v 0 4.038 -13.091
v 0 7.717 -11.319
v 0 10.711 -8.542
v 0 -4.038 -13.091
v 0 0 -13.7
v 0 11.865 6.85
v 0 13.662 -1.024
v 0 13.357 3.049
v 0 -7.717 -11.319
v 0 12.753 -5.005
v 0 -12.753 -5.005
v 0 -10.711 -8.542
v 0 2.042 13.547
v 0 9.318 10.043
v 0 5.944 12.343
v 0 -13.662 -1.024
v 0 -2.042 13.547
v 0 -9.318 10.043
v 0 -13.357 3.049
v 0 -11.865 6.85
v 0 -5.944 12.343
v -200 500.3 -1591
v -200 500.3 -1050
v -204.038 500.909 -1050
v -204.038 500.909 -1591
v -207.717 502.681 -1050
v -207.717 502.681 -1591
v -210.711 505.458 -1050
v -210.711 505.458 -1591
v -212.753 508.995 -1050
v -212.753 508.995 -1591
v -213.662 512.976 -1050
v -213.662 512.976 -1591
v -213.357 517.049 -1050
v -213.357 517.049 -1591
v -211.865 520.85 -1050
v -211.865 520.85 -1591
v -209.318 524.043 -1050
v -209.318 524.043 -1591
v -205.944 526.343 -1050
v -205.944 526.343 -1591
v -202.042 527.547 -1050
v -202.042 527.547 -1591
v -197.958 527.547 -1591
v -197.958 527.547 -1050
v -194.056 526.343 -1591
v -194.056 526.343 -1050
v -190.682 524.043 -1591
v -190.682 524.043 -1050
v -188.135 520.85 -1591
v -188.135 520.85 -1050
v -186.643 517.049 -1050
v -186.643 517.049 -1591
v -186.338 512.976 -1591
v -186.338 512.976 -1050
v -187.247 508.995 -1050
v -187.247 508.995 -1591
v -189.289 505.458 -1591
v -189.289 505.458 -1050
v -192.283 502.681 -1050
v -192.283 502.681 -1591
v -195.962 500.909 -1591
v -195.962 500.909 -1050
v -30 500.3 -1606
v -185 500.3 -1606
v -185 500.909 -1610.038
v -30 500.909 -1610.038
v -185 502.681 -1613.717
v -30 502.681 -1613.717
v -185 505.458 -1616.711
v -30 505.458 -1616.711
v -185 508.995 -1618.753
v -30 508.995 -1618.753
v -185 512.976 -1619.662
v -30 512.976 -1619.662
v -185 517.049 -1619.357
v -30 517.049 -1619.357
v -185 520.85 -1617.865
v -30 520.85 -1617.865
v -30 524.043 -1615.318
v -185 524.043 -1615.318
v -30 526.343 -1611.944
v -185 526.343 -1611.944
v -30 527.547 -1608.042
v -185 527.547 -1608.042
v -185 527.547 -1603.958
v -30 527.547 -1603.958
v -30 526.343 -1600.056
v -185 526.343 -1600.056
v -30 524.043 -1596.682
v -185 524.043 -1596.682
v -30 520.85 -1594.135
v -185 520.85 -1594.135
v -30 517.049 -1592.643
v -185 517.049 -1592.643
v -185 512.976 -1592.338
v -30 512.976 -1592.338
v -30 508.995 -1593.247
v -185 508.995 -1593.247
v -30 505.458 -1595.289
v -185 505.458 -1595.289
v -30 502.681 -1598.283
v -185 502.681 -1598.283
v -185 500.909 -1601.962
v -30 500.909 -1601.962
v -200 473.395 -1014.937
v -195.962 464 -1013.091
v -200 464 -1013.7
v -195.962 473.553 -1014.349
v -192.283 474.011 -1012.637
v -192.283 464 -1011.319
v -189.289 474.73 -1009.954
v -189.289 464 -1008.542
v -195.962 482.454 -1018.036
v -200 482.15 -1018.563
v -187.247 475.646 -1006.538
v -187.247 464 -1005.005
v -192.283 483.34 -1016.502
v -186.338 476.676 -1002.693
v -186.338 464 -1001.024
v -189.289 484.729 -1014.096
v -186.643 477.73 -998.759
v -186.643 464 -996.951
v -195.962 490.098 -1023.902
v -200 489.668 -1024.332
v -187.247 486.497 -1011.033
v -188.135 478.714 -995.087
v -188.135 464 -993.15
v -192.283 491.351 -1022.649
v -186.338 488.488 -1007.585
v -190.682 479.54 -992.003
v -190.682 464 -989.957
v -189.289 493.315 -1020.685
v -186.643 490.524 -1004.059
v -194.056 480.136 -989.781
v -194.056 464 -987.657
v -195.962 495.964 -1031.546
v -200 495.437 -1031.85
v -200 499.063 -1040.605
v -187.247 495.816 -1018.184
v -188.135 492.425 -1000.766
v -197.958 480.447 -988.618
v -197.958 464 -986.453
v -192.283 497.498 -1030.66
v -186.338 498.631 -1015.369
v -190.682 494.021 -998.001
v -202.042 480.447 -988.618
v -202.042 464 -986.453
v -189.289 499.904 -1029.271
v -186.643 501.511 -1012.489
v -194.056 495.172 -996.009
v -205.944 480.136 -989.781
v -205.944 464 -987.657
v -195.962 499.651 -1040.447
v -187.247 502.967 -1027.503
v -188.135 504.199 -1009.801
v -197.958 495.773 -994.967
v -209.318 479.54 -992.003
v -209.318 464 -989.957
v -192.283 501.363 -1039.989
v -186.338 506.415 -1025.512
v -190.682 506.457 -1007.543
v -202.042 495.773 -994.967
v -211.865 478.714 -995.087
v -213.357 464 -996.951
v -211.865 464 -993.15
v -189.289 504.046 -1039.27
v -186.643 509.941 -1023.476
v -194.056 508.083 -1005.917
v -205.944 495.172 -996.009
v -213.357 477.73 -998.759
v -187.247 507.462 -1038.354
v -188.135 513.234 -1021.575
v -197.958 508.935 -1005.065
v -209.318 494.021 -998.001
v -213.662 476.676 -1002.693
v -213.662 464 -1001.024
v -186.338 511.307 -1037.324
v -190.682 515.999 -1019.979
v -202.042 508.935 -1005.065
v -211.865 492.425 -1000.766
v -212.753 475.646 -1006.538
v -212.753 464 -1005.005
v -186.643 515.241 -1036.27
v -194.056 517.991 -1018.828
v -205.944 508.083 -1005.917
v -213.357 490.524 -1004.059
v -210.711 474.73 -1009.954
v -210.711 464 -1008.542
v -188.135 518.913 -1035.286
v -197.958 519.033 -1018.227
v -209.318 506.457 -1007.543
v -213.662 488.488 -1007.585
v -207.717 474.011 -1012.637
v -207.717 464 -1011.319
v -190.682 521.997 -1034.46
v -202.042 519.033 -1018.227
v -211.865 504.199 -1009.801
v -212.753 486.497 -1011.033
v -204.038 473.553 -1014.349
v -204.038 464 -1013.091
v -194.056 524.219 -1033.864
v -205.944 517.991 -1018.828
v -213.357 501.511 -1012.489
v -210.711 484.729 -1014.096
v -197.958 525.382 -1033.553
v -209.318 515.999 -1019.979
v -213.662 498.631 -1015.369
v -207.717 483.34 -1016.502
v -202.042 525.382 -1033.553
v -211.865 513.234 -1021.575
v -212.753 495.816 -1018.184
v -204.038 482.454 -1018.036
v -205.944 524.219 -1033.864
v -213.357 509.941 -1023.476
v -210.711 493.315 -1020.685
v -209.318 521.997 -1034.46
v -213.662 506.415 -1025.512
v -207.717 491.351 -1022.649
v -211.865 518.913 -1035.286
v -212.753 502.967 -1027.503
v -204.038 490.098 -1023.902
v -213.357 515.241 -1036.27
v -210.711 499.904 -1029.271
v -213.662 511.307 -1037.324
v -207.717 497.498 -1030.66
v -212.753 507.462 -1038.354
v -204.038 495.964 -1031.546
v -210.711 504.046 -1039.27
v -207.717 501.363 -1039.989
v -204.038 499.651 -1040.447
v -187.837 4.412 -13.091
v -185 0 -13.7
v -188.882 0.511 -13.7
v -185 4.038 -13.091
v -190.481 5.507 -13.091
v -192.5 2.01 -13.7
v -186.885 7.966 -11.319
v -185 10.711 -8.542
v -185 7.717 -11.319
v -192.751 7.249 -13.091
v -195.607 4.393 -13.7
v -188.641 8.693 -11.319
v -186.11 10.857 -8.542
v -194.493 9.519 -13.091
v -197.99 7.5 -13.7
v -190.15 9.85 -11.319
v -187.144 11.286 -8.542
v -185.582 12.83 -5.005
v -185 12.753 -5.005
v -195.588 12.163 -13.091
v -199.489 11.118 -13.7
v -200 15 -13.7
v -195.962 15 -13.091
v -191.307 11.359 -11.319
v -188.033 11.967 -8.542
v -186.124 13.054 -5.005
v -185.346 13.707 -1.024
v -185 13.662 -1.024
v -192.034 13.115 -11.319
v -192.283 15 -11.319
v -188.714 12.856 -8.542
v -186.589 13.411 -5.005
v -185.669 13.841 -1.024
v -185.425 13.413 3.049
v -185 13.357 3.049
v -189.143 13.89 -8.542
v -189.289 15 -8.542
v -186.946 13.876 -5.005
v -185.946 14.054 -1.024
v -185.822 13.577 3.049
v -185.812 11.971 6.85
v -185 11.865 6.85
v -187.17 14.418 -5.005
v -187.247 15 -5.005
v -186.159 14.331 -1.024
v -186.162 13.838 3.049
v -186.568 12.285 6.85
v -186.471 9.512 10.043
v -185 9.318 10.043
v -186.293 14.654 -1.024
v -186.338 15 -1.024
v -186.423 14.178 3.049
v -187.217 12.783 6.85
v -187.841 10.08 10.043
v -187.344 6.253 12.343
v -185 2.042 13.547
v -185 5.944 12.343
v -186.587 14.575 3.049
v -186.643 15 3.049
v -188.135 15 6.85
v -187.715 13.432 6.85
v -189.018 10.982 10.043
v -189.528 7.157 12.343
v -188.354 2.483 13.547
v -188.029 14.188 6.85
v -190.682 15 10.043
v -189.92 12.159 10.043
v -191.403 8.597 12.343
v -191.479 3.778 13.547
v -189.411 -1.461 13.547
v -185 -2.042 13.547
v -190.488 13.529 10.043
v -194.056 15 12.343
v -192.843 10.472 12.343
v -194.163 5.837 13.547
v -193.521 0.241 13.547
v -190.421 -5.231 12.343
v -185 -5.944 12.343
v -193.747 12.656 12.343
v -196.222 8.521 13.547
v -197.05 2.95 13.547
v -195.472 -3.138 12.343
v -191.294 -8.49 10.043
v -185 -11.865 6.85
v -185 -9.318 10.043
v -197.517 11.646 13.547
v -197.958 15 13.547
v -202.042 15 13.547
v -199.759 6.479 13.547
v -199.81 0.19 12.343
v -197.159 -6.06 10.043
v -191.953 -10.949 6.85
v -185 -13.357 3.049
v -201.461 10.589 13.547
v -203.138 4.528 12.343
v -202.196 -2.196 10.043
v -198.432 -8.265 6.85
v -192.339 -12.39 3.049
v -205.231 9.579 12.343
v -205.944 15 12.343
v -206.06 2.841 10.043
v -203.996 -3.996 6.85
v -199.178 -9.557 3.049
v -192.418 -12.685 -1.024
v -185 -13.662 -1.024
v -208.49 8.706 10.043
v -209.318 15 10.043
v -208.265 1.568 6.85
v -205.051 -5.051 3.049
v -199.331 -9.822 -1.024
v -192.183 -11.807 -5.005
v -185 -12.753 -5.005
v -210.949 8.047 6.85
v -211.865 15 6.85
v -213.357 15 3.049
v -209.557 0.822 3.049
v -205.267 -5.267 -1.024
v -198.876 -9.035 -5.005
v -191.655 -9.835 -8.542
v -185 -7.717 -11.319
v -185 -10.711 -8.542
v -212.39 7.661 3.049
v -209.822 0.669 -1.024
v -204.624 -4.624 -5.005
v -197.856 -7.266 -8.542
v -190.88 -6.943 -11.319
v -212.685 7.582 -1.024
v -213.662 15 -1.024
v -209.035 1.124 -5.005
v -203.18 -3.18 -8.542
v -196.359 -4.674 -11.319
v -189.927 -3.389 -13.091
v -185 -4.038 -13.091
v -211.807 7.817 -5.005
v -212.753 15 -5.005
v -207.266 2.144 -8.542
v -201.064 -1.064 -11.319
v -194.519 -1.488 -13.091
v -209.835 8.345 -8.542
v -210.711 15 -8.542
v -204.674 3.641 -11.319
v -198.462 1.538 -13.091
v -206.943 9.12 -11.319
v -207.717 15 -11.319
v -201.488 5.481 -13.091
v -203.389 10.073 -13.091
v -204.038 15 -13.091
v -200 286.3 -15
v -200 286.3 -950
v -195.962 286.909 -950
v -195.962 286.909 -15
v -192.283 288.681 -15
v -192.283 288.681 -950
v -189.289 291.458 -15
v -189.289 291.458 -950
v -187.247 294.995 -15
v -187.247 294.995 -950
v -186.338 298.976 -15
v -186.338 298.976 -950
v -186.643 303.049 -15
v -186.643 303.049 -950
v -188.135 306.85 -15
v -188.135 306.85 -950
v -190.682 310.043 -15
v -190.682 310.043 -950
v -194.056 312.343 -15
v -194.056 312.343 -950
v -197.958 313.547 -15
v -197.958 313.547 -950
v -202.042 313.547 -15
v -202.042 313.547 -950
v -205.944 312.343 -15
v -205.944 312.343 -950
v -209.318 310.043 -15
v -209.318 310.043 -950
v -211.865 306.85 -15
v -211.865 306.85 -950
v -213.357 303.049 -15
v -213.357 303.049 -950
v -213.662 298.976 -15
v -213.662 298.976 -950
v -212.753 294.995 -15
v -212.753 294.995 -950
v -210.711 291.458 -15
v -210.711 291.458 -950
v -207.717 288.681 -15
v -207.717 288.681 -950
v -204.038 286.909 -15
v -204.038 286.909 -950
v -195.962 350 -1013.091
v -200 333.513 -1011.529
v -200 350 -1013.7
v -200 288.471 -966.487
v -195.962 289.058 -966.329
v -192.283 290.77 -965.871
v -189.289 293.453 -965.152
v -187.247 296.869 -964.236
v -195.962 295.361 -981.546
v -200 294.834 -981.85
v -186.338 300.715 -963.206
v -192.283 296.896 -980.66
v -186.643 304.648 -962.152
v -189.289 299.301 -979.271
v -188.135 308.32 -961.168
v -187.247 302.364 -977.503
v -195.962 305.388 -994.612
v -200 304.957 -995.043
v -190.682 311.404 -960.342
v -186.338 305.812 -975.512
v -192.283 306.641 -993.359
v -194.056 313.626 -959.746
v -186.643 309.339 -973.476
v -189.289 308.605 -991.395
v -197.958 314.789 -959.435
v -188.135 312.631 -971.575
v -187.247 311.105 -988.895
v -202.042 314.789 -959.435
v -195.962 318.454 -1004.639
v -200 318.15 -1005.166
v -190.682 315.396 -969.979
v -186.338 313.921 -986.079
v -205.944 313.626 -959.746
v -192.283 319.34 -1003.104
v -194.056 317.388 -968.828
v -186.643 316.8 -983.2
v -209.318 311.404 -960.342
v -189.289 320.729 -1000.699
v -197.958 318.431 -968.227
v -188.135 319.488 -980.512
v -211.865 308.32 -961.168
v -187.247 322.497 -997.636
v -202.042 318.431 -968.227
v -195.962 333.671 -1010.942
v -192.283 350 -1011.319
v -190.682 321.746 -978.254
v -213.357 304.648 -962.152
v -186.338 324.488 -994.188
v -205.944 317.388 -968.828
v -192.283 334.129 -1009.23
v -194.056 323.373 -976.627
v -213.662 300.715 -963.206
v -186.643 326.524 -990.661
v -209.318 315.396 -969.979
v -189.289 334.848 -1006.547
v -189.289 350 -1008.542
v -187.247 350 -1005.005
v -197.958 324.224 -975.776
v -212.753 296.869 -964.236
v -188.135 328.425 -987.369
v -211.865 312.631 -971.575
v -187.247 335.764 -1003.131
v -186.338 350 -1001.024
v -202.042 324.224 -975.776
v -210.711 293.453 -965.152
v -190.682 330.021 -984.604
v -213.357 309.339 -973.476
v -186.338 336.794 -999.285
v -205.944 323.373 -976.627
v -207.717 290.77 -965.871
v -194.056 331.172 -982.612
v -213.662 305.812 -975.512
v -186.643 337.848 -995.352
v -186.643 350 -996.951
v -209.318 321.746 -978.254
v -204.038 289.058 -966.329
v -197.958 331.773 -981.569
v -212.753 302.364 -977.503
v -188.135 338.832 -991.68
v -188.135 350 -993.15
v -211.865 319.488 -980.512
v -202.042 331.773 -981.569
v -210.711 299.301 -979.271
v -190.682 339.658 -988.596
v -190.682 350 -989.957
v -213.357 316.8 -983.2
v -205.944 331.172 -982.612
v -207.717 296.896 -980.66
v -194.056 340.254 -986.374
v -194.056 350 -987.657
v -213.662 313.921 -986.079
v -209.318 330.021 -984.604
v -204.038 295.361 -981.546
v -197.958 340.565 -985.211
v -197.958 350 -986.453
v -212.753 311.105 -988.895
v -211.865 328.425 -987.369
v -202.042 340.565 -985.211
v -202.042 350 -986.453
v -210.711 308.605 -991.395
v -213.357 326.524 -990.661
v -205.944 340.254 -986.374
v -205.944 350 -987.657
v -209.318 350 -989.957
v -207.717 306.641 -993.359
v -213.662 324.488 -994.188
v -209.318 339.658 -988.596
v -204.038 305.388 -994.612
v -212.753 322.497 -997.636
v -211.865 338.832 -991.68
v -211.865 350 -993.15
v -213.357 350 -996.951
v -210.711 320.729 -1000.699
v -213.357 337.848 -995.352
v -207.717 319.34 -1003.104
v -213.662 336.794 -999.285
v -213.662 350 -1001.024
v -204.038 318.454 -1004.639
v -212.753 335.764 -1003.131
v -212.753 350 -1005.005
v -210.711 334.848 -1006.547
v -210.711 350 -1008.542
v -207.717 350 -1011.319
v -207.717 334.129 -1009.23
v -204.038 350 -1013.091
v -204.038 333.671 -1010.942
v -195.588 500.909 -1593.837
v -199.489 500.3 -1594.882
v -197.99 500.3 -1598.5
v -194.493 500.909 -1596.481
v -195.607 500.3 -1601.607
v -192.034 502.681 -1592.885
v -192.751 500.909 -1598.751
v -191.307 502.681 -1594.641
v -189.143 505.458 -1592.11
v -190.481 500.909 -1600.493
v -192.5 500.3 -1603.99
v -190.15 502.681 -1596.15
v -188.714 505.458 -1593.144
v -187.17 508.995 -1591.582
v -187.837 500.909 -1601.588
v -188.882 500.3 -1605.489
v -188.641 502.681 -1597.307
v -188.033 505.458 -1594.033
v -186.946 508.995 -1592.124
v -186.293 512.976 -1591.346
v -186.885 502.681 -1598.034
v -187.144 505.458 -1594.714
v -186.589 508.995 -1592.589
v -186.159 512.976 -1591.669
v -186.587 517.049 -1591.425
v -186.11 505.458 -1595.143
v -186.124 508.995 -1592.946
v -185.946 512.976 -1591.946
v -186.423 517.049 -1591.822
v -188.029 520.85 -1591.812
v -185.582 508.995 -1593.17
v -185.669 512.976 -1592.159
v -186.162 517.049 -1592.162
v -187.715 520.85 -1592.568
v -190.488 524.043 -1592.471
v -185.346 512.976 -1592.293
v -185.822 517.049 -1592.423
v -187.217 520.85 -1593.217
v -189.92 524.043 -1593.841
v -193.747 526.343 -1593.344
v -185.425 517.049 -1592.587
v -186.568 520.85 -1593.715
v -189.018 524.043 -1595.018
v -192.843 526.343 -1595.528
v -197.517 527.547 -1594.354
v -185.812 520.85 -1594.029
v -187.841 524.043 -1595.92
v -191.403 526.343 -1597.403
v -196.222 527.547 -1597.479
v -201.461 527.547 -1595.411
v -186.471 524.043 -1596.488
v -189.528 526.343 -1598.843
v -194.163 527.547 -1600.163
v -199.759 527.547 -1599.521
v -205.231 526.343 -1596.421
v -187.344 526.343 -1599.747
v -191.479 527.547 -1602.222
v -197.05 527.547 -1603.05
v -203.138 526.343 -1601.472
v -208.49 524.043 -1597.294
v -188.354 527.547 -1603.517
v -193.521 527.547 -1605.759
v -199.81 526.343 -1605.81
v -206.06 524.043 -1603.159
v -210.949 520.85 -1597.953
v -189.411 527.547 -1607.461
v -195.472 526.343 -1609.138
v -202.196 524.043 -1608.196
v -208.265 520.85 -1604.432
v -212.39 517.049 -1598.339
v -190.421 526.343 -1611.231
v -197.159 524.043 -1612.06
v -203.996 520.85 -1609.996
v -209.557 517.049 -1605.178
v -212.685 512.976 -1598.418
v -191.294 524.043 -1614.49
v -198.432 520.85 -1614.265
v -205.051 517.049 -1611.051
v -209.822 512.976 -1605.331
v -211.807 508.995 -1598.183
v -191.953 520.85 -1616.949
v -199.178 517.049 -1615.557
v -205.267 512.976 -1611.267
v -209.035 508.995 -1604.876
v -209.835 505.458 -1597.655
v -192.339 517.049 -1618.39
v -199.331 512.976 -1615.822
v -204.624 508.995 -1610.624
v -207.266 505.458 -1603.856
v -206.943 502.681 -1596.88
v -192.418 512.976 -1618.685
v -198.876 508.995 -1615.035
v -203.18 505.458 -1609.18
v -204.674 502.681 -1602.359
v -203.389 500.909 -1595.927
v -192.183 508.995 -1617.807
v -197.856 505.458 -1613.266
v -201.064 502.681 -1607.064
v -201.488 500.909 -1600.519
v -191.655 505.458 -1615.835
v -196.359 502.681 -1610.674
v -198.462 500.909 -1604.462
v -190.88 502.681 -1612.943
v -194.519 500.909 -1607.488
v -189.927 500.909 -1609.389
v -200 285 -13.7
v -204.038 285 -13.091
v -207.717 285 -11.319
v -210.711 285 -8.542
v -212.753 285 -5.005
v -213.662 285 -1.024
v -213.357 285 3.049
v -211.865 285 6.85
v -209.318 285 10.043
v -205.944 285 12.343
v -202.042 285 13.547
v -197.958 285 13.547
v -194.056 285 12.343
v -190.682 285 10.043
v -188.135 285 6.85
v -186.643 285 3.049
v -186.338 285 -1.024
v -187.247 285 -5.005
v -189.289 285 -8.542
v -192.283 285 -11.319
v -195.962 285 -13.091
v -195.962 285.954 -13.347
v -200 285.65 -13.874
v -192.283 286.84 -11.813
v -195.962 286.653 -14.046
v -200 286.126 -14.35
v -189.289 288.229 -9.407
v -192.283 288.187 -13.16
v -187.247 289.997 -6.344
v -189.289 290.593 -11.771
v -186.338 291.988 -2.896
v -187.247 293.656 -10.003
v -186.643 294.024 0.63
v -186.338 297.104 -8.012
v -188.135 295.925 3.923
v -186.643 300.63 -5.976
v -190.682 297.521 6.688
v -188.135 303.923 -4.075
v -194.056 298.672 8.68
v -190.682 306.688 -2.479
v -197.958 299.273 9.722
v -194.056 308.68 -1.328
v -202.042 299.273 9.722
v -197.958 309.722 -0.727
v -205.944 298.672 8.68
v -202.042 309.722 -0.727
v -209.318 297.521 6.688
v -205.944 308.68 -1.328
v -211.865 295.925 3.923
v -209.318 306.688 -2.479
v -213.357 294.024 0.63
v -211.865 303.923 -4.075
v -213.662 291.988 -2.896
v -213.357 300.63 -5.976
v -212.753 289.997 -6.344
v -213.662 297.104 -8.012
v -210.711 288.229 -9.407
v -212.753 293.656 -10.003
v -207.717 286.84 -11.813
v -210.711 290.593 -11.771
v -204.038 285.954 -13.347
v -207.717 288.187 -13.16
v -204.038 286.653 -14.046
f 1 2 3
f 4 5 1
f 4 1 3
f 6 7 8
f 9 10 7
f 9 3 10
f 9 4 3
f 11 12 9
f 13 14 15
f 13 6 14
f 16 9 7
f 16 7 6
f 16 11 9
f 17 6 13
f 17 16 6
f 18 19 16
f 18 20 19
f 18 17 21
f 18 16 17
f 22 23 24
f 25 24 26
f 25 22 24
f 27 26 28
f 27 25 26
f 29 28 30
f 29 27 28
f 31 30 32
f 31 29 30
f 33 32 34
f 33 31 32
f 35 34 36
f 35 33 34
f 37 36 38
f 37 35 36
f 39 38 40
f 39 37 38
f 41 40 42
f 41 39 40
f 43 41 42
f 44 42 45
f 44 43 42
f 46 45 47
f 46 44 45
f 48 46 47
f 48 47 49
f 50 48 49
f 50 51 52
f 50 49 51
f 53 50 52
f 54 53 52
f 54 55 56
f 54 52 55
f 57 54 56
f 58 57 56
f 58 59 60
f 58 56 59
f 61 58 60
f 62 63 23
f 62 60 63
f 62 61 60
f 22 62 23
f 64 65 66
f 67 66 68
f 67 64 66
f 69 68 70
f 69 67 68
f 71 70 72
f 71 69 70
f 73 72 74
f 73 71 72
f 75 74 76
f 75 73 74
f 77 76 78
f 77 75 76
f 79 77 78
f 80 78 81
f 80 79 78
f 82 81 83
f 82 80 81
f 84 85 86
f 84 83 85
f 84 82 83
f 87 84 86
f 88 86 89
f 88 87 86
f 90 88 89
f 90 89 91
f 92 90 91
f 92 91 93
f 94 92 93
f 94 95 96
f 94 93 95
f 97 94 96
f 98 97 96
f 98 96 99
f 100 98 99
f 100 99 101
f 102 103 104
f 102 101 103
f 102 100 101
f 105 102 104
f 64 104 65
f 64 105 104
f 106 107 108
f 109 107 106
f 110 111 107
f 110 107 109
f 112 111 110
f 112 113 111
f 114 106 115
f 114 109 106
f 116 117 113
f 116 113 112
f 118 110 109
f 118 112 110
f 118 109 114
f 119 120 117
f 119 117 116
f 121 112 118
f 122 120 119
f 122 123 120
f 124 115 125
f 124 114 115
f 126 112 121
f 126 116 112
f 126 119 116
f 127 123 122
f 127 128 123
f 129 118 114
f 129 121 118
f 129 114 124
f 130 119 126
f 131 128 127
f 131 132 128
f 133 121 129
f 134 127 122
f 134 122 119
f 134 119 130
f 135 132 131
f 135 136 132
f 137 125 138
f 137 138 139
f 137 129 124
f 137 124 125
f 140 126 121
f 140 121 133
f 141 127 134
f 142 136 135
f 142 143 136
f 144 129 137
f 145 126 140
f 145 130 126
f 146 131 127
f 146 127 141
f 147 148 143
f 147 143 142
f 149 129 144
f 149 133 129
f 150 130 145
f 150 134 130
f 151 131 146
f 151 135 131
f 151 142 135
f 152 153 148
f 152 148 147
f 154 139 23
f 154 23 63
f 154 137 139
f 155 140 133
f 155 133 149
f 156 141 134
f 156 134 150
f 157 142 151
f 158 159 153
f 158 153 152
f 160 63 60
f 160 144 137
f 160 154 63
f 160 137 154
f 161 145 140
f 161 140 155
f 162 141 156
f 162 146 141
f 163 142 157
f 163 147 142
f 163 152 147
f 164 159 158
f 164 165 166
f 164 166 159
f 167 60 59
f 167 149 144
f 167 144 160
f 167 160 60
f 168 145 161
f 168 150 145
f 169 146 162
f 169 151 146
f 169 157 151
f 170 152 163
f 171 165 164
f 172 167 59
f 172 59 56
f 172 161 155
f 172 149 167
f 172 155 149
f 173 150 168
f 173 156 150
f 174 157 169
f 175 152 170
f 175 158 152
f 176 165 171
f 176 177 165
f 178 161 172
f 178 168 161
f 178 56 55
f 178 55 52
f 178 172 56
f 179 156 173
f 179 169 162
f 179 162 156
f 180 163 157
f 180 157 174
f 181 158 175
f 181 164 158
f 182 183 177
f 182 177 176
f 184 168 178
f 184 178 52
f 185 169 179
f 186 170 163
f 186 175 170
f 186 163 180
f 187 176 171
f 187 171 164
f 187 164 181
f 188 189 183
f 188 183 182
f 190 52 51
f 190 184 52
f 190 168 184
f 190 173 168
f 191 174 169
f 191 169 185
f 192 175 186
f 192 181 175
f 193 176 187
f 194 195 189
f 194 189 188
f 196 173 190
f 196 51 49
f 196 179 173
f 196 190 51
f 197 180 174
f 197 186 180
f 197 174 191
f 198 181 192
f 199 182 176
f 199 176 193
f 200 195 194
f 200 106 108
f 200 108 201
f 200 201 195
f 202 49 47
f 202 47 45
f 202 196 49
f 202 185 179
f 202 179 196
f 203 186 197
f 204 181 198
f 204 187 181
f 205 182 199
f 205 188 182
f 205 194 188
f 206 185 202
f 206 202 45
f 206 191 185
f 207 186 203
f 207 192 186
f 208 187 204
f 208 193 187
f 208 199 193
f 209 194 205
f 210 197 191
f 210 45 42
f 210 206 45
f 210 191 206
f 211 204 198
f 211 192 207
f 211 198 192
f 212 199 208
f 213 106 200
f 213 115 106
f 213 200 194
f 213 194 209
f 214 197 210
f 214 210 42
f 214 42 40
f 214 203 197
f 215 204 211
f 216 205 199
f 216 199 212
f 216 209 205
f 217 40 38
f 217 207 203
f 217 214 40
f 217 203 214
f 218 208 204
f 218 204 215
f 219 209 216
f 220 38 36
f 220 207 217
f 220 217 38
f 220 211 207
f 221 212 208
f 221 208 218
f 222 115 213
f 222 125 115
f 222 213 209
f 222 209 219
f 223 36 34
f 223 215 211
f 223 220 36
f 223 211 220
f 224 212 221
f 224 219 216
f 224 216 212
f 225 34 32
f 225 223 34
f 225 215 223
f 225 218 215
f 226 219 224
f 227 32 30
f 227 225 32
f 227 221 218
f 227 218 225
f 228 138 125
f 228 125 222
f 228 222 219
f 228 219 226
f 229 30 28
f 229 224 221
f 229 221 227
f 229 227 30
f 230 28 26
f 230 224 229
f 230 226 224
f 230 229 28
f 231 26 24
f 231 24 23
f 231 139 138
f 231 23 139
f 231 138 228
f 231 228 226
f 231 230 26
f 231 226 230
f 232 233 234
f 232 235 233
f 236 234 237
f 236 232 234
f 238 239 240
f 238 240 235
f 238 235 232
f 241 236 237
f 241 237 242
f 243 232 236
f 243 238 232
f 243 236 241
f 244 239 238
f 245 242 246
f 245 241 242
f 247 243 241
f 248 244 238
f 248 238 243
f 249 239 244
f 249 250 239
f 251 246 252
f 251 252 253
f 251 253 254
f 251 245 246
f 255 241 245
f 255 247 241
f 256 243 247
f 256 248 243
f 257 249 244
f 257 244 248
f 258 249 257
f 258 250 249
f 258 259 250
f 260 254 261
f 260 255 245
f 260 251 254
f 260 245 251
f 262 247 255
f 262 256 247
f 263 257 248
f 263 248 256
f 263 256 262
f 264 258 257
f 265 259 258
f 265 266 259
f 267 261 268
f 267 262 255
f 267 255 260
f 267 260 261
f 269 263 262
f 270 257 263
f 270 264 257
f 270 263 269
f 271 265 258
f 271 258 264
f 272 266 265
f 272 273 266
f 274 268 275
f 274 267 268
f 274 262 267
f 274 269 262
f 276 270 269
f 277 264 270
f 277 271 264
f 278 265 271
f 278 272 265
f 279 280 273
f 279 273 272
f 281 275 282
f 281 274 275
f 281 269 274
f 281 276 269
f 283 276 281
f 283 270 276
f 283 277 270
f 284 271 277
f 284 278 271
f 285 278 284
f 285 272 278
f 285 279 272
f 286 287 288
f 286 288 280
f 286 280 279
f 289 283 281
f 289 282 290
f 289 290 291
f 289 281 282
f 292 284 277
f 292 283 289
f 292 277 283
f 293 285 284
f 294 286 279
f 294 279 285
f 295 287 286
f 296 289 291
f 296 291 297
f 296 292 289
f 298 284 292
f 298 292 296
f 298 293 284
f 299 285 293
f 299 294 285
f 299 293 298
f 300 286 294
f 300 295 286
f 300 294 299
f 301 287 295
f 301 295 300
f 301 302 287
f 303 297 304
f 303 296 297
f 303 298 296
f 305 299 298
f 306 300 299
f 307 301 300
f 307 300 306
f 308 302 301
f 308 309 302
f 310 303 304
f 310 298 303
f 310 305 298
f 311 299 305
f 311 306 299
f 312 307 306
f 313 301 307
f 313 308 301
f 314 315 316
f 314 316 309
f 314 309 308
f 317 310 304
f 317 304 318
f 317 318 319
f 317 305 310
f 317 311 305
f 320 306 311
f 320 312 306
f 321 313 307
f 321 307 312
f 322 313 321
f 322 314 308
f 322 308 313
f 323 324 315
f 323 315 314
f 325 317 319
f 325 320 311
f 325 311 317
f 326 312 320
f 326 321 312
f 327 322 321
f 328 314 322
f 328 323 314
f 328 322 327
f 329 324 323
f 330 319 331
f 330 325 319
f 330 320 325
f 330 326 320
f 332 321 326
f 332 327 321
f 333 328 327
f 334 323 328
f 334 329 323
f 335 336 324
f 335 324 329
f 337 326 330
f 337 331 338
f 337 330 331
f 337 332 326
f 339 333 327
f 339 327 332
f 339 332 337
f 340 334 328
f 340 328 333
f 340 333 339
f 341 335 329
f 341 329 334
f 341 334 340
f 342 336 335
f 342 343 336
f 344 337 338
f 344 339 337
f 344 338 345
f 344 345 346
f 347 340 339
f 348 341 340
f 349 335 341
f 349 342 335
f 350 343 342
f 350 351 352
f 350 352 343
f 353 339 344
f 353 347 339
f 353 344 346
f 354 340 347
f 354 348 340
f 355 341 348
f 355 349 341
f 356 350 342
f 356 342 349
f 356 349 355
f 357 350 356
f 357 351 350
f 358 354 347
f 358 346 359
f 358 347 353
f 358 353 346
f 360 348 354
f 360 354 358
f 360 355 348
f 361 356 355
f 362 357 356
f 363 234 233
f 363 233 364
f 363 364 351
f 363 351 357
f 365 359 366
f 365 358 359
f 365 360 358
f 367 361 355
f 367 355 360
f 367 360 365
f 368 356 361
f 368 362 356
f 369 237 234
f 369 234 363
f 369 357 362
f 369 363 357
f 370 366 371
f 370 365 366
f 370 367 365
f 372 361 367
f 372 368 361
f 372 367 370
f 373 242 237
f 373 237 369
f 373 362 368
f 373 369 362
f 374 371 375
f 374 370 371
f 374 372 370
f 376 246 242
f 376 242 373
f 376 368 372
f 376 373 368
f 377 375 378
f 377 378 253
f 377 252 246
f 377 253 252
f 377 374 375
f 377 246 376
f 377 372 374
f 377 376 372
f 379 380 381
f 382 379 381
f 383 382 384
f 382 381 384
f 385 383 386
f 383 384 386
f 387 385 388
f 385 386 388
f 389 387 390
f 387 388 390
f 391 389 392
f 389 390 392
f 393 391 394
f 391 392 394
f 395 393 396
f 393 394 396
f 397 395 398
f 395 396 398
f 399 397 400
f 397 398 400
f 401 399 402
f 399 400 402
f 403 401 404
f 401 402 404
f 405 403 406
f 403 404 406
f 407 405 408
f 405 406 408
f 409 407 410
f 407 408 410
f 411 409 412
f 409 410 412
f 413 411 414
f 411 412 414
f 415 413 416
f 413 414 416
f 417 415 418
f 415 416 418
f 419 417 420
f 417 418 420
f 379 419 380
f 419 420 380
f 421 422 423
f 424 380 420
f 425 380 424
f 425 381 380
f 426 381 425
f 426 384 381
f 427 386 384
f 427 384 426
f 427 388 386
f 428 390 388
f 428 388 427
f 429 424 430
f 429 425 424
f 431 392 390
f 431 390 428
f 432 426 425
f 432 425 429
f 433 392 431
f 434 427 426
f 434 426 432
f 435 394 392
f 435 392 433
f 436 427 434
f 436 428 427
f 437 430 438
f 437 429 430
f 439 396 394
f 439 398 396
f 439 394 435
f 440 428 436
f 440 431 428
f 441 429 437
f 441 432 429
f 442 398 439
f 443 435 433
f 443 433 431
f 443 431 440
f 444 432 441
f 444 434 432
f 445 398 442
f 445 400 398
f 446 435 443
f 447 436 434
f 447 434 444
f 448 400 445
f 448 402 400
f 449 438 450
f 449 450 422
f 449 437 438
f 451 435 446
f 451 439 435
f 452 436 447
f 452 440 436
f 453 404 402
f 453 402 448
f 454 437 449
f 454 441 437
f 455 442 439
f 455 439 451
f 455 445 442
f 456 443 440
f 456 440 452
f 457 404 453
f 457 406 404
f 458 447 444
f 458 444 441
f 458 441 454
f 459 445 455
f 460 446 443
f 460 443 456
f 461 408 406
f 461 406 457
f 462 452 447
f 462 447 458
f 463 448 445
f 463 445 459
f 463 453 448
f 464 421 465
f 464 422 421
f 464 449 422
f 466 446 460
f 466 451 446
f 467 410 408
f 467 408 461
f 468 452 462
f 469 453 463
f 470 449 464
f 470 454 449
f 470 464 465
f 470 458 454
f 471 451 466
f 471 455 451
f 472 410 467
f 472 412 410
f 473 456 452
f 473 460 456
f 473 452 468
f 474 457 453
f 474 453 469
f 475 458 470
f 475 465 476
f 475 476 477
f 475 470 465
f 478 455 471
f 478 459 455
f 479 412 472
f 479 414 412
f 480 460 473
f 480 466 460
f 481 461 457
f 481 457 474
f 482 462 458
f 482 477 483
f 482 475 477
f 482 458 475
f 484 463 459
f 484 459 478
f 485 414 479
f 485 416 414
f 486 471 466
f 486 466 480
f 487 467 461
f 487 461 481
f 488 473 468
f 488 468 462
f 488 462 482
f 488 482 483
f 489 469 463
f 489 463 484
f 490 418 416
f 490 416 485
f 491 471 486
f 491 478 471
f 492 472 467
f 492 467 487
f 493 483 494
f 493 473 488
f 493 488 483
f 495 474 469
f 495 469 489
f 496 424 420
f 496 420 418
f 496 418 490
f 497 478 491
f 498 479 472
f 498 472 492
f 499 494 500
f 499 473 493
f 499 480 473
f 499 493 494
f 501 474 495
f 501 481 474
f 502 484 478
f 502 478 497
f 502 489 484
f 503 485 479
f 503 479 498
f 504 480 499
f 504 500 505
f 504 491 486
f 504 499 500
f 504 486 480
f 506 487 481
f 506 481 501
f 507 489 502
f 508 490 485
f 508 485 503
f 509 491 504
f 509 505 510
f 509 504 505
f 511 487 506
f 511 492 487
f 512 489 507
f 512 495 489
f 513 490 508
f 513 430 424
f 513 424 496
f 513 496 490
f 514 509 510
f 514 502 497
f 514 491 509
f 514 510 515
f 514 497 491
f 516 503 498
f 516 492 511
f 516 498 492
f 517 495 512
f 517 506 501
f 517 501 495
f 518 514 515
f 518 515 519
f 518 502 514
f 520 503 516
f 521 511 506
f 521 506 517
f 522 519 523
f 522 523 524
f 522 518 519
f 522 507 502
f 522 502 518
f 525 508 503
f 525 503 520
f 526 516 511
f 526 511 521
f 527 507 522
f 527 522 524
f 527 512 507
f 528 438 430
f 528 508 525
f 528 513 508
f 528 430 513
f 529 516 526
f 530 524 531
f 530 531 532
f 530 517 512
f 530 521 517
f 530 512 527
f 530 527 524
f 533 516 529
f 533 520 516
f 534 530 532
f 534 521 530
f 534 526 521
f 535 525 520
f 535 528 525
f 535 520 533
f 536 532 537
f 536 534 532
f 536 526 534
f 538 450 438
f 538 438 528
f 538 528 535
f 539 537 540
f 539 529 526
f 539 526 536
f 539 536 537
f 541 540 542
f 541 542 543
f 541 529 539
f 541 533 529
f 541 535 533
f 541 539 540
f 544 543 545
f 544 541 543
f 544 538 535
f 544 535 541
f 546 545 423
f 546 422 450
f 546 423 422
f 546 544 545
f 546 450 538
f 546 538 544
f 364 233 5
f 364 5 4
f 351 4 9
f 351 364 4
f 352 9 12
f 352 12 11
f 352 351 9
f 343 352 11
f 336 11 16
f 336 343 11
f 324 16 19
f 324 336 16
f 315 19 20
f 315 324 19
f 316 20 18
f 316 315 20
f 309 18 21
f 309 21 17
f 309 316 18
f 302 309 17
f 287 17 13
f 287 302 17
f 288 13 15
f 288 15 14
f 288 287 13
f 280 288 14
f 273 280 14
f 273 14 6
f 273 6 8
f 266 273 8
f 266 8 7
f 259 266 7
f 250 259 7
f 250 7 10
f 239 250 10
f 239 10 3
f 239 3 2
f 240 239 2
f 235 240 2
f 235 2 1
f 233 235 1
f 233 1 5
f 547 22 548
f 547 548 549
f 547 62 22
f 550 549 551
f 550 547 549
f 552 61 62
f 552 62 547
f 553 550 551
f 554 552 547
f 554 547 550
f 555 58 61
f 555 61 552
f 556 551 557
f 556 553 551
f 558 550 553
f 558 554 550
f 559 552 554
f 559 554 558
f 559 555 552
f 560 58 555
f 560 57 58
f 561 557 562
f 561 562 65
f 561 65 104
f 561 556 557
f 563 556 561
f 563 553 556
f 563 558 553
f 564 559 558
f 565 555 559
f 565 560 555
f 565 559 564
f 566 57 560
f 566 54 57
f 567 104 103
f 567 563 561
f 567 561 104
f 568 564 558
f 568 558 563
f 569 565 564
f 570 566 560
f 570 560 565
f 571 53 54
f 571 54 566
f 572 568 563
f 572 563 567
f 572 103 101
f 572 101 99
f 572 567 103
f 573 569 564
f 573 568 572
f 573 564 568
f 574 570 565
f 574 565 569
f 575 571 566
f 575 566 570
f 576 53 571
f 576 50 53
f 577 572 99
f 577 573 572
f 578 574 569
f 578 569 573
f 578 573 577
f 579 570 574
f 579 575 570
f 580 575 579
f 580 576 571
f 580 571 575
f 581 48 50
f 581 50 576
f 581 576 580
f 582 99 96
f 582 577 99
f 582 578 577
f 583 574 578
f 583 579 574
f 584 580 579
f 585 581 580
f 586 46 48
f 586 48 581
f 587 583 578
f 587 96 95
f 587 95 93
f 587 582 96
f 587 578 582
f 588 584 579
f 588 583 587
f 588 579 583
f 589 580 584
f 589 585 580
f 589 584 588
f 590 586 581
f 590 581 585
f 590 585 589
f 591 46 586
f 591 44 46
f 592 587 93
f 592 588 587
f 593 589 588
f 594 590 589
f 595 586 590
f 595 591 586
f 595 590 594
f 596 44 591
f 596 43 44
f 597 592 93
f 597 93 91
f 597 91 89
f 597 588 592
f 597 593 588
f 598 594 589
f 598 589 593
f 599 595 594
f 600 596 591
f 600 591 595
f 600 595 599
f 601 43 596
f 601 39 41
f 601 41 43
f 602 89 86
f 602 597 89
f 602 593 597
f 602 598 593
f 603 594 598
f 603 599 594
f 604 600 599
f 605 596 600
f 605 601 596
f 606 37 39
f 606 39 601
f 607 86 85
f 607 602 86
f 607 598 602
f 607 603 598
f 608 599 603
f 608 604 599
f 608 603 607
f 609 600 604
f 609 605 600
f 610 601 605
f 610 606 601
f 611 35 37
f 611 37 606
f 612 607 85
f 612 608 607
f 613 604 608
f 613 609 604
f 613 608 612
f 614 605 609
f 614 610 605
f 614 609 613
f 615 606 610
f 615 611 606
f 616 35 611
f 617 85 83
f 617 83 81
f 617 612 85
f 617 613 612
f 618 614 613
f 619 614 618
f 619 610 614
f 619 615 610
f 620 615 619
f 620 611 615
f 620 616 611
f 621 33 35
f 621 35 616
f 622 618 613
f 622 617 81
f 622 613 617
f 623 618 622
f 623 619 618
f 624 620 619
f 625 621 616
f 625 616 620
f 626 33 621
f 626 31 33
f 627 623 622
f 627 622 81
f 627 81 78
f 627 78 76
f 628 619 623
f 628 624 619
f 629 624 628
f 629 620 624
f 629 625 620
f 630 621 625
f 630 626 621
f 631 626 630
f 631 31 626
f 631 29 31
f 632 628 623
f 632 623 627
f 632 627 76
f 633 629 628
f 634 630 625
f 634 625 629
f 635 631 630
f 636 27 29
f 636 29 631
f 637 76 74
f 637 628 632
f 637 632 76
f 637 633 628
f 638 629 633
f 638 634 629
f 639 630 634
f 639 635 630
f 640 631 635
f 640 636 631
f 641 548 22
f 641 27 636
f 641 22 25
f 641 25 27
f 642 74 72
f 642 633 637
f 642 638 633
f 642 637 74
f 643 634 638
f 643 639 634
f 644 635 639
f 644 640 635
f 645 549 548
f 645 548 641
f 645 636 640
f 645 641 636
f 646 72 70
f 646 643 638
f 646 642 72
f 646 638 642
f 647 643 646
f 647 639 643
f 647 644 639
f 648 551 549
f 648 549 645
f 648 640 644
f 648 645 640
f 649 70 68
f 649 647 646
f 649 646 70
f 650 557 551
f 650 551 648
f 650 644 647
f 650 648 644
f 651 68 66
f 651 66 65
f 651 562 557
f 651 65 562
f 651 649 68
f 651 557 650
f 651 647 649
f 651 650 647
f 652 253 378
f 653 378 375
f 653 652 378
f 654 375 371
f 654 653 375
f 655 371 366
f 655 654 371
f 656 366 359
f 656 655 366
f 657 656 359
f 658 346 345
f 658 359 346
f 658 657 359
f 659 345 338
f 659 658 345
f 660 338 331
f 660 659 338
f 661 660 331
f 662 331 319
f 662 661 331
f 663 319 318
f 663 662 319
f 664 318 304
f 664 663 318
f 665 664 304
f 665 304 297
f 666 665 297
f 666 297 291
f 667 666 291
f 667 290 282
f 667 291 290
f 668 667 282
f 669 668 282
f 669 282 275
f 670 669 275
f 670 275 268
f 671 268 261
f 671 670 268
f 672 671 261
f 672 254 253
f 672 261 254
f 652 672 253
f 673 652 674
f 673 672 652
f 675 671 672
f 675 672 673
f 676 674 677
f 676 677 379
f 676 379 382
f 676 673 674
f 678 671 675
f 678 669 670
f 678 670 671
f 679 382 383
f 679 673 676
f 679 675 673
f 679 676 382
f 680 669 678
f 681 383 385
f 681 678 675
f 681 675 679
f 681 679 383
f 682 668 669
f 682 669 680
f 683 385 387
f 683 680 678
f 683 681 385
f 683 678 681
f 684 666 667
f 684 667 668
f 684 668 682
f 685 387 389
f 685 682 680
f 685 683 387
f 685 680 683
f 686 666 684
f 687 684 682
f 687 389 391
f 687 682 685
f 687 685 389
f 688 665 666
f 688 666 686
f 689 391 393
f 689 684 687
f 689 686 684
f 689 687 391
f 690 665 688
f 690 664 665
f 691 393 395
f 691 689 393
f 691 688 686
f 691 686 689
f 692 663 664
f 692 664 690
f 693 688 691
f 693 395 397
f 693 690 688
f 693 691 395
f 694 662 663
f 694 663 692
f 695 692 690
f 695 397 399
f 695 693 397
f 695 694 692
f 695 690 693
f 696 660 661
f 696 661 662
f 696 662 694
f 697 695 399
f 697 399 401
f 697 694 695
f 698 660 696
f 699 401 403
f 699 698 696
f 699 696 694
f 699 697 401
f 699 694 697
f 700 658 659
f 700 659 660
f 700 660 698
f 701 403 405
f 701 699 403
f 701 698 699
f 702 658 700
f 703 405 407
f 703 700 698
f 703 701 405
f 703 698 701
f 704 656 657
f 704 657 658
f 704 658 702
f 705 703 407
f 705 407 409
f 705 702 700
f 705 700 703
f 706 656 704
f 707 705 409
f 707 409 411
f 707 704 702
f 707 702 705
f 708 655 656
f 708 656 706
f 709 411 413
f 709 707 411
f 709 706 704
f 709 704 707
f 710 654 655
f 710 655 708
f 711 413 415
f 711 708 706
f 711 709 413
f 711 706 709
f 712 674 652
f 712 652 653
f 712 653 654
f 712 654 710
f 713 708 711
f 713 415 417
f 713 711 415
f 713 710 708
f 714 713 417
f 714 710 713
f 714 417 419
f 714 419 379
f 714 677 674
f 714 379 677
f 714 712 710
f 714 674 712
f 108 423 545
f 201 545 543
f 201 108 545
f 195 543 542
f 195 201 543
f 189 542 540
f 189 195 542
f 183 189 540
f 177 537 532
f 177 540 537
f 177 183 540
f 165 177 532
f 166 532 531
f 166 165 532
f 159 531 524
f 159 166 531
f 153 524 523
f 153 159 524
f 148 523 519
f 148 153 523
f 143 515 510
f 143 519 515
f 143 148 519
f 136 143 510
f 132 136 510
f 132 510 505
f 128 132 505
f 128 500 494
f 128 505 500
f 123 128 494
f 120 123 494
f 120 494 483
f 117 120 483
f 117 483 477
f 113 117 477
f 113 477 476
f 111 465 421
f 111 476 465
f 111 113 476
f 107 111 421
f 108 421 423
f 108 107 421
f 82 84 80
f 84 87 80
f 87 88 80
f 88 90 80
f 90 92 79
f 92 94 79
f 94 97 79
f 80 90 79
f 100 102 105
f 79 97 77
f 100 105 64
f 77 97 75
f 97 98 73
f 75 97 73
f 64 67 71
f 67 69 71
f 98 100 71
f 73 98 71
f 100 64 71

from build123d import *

# Parameters (mm, degrees)
CROQUIS1_R = 13.7


with BuildPart() as part:
    # Barrer1: sweep along a curve in space
    with BuildLine() as barrer1_path:
        Line((0, 0, 0), (-185, 0, 0))
        ThreePointArc((-185, 0, 0), (-195.606601718, 4.393398282, 0), (-200, 15, 0))
        Line((-200, 15, 0), (-200, 285, 0))
        ThreePointArc((-200, 300, -15), (-200, 295.606601718, -4.393398282), (-200, 285, 0))
        Line((-200, 300, -15), (-200, 300, -950))
        ThreePointArc((-200, 350, -1000), (-200, 314.644660941, -985.355339059), (-200, 300, -950))
        Line((-200, 464, -1000), (-200, 350, -1000))
        ThreePointArc((-200, 464, -1000), (-200, 499.355339059, -1014.644660941), (-200, 514, -1050))
        Line((-200, 514, -1050), (-200, 514, -1591))
        ThreePointArc((-200, 514, -1591), (-195.606601718, 514, -1601.606601718), (-185, 514, -1606))
        Line((-185, 514, -1606), (-30, 514, -1606))
    # Croquis1 → Barrer1 (sweep)
    with BuildSketch(Plane(origin=(0, 0, 0), x_dir=(0, 0, -1), z_dir=(1, 0, 0))):
        Circle(CROQUIS1_R)
    sweep(path=barrer1_path.line)


solid = part.part
